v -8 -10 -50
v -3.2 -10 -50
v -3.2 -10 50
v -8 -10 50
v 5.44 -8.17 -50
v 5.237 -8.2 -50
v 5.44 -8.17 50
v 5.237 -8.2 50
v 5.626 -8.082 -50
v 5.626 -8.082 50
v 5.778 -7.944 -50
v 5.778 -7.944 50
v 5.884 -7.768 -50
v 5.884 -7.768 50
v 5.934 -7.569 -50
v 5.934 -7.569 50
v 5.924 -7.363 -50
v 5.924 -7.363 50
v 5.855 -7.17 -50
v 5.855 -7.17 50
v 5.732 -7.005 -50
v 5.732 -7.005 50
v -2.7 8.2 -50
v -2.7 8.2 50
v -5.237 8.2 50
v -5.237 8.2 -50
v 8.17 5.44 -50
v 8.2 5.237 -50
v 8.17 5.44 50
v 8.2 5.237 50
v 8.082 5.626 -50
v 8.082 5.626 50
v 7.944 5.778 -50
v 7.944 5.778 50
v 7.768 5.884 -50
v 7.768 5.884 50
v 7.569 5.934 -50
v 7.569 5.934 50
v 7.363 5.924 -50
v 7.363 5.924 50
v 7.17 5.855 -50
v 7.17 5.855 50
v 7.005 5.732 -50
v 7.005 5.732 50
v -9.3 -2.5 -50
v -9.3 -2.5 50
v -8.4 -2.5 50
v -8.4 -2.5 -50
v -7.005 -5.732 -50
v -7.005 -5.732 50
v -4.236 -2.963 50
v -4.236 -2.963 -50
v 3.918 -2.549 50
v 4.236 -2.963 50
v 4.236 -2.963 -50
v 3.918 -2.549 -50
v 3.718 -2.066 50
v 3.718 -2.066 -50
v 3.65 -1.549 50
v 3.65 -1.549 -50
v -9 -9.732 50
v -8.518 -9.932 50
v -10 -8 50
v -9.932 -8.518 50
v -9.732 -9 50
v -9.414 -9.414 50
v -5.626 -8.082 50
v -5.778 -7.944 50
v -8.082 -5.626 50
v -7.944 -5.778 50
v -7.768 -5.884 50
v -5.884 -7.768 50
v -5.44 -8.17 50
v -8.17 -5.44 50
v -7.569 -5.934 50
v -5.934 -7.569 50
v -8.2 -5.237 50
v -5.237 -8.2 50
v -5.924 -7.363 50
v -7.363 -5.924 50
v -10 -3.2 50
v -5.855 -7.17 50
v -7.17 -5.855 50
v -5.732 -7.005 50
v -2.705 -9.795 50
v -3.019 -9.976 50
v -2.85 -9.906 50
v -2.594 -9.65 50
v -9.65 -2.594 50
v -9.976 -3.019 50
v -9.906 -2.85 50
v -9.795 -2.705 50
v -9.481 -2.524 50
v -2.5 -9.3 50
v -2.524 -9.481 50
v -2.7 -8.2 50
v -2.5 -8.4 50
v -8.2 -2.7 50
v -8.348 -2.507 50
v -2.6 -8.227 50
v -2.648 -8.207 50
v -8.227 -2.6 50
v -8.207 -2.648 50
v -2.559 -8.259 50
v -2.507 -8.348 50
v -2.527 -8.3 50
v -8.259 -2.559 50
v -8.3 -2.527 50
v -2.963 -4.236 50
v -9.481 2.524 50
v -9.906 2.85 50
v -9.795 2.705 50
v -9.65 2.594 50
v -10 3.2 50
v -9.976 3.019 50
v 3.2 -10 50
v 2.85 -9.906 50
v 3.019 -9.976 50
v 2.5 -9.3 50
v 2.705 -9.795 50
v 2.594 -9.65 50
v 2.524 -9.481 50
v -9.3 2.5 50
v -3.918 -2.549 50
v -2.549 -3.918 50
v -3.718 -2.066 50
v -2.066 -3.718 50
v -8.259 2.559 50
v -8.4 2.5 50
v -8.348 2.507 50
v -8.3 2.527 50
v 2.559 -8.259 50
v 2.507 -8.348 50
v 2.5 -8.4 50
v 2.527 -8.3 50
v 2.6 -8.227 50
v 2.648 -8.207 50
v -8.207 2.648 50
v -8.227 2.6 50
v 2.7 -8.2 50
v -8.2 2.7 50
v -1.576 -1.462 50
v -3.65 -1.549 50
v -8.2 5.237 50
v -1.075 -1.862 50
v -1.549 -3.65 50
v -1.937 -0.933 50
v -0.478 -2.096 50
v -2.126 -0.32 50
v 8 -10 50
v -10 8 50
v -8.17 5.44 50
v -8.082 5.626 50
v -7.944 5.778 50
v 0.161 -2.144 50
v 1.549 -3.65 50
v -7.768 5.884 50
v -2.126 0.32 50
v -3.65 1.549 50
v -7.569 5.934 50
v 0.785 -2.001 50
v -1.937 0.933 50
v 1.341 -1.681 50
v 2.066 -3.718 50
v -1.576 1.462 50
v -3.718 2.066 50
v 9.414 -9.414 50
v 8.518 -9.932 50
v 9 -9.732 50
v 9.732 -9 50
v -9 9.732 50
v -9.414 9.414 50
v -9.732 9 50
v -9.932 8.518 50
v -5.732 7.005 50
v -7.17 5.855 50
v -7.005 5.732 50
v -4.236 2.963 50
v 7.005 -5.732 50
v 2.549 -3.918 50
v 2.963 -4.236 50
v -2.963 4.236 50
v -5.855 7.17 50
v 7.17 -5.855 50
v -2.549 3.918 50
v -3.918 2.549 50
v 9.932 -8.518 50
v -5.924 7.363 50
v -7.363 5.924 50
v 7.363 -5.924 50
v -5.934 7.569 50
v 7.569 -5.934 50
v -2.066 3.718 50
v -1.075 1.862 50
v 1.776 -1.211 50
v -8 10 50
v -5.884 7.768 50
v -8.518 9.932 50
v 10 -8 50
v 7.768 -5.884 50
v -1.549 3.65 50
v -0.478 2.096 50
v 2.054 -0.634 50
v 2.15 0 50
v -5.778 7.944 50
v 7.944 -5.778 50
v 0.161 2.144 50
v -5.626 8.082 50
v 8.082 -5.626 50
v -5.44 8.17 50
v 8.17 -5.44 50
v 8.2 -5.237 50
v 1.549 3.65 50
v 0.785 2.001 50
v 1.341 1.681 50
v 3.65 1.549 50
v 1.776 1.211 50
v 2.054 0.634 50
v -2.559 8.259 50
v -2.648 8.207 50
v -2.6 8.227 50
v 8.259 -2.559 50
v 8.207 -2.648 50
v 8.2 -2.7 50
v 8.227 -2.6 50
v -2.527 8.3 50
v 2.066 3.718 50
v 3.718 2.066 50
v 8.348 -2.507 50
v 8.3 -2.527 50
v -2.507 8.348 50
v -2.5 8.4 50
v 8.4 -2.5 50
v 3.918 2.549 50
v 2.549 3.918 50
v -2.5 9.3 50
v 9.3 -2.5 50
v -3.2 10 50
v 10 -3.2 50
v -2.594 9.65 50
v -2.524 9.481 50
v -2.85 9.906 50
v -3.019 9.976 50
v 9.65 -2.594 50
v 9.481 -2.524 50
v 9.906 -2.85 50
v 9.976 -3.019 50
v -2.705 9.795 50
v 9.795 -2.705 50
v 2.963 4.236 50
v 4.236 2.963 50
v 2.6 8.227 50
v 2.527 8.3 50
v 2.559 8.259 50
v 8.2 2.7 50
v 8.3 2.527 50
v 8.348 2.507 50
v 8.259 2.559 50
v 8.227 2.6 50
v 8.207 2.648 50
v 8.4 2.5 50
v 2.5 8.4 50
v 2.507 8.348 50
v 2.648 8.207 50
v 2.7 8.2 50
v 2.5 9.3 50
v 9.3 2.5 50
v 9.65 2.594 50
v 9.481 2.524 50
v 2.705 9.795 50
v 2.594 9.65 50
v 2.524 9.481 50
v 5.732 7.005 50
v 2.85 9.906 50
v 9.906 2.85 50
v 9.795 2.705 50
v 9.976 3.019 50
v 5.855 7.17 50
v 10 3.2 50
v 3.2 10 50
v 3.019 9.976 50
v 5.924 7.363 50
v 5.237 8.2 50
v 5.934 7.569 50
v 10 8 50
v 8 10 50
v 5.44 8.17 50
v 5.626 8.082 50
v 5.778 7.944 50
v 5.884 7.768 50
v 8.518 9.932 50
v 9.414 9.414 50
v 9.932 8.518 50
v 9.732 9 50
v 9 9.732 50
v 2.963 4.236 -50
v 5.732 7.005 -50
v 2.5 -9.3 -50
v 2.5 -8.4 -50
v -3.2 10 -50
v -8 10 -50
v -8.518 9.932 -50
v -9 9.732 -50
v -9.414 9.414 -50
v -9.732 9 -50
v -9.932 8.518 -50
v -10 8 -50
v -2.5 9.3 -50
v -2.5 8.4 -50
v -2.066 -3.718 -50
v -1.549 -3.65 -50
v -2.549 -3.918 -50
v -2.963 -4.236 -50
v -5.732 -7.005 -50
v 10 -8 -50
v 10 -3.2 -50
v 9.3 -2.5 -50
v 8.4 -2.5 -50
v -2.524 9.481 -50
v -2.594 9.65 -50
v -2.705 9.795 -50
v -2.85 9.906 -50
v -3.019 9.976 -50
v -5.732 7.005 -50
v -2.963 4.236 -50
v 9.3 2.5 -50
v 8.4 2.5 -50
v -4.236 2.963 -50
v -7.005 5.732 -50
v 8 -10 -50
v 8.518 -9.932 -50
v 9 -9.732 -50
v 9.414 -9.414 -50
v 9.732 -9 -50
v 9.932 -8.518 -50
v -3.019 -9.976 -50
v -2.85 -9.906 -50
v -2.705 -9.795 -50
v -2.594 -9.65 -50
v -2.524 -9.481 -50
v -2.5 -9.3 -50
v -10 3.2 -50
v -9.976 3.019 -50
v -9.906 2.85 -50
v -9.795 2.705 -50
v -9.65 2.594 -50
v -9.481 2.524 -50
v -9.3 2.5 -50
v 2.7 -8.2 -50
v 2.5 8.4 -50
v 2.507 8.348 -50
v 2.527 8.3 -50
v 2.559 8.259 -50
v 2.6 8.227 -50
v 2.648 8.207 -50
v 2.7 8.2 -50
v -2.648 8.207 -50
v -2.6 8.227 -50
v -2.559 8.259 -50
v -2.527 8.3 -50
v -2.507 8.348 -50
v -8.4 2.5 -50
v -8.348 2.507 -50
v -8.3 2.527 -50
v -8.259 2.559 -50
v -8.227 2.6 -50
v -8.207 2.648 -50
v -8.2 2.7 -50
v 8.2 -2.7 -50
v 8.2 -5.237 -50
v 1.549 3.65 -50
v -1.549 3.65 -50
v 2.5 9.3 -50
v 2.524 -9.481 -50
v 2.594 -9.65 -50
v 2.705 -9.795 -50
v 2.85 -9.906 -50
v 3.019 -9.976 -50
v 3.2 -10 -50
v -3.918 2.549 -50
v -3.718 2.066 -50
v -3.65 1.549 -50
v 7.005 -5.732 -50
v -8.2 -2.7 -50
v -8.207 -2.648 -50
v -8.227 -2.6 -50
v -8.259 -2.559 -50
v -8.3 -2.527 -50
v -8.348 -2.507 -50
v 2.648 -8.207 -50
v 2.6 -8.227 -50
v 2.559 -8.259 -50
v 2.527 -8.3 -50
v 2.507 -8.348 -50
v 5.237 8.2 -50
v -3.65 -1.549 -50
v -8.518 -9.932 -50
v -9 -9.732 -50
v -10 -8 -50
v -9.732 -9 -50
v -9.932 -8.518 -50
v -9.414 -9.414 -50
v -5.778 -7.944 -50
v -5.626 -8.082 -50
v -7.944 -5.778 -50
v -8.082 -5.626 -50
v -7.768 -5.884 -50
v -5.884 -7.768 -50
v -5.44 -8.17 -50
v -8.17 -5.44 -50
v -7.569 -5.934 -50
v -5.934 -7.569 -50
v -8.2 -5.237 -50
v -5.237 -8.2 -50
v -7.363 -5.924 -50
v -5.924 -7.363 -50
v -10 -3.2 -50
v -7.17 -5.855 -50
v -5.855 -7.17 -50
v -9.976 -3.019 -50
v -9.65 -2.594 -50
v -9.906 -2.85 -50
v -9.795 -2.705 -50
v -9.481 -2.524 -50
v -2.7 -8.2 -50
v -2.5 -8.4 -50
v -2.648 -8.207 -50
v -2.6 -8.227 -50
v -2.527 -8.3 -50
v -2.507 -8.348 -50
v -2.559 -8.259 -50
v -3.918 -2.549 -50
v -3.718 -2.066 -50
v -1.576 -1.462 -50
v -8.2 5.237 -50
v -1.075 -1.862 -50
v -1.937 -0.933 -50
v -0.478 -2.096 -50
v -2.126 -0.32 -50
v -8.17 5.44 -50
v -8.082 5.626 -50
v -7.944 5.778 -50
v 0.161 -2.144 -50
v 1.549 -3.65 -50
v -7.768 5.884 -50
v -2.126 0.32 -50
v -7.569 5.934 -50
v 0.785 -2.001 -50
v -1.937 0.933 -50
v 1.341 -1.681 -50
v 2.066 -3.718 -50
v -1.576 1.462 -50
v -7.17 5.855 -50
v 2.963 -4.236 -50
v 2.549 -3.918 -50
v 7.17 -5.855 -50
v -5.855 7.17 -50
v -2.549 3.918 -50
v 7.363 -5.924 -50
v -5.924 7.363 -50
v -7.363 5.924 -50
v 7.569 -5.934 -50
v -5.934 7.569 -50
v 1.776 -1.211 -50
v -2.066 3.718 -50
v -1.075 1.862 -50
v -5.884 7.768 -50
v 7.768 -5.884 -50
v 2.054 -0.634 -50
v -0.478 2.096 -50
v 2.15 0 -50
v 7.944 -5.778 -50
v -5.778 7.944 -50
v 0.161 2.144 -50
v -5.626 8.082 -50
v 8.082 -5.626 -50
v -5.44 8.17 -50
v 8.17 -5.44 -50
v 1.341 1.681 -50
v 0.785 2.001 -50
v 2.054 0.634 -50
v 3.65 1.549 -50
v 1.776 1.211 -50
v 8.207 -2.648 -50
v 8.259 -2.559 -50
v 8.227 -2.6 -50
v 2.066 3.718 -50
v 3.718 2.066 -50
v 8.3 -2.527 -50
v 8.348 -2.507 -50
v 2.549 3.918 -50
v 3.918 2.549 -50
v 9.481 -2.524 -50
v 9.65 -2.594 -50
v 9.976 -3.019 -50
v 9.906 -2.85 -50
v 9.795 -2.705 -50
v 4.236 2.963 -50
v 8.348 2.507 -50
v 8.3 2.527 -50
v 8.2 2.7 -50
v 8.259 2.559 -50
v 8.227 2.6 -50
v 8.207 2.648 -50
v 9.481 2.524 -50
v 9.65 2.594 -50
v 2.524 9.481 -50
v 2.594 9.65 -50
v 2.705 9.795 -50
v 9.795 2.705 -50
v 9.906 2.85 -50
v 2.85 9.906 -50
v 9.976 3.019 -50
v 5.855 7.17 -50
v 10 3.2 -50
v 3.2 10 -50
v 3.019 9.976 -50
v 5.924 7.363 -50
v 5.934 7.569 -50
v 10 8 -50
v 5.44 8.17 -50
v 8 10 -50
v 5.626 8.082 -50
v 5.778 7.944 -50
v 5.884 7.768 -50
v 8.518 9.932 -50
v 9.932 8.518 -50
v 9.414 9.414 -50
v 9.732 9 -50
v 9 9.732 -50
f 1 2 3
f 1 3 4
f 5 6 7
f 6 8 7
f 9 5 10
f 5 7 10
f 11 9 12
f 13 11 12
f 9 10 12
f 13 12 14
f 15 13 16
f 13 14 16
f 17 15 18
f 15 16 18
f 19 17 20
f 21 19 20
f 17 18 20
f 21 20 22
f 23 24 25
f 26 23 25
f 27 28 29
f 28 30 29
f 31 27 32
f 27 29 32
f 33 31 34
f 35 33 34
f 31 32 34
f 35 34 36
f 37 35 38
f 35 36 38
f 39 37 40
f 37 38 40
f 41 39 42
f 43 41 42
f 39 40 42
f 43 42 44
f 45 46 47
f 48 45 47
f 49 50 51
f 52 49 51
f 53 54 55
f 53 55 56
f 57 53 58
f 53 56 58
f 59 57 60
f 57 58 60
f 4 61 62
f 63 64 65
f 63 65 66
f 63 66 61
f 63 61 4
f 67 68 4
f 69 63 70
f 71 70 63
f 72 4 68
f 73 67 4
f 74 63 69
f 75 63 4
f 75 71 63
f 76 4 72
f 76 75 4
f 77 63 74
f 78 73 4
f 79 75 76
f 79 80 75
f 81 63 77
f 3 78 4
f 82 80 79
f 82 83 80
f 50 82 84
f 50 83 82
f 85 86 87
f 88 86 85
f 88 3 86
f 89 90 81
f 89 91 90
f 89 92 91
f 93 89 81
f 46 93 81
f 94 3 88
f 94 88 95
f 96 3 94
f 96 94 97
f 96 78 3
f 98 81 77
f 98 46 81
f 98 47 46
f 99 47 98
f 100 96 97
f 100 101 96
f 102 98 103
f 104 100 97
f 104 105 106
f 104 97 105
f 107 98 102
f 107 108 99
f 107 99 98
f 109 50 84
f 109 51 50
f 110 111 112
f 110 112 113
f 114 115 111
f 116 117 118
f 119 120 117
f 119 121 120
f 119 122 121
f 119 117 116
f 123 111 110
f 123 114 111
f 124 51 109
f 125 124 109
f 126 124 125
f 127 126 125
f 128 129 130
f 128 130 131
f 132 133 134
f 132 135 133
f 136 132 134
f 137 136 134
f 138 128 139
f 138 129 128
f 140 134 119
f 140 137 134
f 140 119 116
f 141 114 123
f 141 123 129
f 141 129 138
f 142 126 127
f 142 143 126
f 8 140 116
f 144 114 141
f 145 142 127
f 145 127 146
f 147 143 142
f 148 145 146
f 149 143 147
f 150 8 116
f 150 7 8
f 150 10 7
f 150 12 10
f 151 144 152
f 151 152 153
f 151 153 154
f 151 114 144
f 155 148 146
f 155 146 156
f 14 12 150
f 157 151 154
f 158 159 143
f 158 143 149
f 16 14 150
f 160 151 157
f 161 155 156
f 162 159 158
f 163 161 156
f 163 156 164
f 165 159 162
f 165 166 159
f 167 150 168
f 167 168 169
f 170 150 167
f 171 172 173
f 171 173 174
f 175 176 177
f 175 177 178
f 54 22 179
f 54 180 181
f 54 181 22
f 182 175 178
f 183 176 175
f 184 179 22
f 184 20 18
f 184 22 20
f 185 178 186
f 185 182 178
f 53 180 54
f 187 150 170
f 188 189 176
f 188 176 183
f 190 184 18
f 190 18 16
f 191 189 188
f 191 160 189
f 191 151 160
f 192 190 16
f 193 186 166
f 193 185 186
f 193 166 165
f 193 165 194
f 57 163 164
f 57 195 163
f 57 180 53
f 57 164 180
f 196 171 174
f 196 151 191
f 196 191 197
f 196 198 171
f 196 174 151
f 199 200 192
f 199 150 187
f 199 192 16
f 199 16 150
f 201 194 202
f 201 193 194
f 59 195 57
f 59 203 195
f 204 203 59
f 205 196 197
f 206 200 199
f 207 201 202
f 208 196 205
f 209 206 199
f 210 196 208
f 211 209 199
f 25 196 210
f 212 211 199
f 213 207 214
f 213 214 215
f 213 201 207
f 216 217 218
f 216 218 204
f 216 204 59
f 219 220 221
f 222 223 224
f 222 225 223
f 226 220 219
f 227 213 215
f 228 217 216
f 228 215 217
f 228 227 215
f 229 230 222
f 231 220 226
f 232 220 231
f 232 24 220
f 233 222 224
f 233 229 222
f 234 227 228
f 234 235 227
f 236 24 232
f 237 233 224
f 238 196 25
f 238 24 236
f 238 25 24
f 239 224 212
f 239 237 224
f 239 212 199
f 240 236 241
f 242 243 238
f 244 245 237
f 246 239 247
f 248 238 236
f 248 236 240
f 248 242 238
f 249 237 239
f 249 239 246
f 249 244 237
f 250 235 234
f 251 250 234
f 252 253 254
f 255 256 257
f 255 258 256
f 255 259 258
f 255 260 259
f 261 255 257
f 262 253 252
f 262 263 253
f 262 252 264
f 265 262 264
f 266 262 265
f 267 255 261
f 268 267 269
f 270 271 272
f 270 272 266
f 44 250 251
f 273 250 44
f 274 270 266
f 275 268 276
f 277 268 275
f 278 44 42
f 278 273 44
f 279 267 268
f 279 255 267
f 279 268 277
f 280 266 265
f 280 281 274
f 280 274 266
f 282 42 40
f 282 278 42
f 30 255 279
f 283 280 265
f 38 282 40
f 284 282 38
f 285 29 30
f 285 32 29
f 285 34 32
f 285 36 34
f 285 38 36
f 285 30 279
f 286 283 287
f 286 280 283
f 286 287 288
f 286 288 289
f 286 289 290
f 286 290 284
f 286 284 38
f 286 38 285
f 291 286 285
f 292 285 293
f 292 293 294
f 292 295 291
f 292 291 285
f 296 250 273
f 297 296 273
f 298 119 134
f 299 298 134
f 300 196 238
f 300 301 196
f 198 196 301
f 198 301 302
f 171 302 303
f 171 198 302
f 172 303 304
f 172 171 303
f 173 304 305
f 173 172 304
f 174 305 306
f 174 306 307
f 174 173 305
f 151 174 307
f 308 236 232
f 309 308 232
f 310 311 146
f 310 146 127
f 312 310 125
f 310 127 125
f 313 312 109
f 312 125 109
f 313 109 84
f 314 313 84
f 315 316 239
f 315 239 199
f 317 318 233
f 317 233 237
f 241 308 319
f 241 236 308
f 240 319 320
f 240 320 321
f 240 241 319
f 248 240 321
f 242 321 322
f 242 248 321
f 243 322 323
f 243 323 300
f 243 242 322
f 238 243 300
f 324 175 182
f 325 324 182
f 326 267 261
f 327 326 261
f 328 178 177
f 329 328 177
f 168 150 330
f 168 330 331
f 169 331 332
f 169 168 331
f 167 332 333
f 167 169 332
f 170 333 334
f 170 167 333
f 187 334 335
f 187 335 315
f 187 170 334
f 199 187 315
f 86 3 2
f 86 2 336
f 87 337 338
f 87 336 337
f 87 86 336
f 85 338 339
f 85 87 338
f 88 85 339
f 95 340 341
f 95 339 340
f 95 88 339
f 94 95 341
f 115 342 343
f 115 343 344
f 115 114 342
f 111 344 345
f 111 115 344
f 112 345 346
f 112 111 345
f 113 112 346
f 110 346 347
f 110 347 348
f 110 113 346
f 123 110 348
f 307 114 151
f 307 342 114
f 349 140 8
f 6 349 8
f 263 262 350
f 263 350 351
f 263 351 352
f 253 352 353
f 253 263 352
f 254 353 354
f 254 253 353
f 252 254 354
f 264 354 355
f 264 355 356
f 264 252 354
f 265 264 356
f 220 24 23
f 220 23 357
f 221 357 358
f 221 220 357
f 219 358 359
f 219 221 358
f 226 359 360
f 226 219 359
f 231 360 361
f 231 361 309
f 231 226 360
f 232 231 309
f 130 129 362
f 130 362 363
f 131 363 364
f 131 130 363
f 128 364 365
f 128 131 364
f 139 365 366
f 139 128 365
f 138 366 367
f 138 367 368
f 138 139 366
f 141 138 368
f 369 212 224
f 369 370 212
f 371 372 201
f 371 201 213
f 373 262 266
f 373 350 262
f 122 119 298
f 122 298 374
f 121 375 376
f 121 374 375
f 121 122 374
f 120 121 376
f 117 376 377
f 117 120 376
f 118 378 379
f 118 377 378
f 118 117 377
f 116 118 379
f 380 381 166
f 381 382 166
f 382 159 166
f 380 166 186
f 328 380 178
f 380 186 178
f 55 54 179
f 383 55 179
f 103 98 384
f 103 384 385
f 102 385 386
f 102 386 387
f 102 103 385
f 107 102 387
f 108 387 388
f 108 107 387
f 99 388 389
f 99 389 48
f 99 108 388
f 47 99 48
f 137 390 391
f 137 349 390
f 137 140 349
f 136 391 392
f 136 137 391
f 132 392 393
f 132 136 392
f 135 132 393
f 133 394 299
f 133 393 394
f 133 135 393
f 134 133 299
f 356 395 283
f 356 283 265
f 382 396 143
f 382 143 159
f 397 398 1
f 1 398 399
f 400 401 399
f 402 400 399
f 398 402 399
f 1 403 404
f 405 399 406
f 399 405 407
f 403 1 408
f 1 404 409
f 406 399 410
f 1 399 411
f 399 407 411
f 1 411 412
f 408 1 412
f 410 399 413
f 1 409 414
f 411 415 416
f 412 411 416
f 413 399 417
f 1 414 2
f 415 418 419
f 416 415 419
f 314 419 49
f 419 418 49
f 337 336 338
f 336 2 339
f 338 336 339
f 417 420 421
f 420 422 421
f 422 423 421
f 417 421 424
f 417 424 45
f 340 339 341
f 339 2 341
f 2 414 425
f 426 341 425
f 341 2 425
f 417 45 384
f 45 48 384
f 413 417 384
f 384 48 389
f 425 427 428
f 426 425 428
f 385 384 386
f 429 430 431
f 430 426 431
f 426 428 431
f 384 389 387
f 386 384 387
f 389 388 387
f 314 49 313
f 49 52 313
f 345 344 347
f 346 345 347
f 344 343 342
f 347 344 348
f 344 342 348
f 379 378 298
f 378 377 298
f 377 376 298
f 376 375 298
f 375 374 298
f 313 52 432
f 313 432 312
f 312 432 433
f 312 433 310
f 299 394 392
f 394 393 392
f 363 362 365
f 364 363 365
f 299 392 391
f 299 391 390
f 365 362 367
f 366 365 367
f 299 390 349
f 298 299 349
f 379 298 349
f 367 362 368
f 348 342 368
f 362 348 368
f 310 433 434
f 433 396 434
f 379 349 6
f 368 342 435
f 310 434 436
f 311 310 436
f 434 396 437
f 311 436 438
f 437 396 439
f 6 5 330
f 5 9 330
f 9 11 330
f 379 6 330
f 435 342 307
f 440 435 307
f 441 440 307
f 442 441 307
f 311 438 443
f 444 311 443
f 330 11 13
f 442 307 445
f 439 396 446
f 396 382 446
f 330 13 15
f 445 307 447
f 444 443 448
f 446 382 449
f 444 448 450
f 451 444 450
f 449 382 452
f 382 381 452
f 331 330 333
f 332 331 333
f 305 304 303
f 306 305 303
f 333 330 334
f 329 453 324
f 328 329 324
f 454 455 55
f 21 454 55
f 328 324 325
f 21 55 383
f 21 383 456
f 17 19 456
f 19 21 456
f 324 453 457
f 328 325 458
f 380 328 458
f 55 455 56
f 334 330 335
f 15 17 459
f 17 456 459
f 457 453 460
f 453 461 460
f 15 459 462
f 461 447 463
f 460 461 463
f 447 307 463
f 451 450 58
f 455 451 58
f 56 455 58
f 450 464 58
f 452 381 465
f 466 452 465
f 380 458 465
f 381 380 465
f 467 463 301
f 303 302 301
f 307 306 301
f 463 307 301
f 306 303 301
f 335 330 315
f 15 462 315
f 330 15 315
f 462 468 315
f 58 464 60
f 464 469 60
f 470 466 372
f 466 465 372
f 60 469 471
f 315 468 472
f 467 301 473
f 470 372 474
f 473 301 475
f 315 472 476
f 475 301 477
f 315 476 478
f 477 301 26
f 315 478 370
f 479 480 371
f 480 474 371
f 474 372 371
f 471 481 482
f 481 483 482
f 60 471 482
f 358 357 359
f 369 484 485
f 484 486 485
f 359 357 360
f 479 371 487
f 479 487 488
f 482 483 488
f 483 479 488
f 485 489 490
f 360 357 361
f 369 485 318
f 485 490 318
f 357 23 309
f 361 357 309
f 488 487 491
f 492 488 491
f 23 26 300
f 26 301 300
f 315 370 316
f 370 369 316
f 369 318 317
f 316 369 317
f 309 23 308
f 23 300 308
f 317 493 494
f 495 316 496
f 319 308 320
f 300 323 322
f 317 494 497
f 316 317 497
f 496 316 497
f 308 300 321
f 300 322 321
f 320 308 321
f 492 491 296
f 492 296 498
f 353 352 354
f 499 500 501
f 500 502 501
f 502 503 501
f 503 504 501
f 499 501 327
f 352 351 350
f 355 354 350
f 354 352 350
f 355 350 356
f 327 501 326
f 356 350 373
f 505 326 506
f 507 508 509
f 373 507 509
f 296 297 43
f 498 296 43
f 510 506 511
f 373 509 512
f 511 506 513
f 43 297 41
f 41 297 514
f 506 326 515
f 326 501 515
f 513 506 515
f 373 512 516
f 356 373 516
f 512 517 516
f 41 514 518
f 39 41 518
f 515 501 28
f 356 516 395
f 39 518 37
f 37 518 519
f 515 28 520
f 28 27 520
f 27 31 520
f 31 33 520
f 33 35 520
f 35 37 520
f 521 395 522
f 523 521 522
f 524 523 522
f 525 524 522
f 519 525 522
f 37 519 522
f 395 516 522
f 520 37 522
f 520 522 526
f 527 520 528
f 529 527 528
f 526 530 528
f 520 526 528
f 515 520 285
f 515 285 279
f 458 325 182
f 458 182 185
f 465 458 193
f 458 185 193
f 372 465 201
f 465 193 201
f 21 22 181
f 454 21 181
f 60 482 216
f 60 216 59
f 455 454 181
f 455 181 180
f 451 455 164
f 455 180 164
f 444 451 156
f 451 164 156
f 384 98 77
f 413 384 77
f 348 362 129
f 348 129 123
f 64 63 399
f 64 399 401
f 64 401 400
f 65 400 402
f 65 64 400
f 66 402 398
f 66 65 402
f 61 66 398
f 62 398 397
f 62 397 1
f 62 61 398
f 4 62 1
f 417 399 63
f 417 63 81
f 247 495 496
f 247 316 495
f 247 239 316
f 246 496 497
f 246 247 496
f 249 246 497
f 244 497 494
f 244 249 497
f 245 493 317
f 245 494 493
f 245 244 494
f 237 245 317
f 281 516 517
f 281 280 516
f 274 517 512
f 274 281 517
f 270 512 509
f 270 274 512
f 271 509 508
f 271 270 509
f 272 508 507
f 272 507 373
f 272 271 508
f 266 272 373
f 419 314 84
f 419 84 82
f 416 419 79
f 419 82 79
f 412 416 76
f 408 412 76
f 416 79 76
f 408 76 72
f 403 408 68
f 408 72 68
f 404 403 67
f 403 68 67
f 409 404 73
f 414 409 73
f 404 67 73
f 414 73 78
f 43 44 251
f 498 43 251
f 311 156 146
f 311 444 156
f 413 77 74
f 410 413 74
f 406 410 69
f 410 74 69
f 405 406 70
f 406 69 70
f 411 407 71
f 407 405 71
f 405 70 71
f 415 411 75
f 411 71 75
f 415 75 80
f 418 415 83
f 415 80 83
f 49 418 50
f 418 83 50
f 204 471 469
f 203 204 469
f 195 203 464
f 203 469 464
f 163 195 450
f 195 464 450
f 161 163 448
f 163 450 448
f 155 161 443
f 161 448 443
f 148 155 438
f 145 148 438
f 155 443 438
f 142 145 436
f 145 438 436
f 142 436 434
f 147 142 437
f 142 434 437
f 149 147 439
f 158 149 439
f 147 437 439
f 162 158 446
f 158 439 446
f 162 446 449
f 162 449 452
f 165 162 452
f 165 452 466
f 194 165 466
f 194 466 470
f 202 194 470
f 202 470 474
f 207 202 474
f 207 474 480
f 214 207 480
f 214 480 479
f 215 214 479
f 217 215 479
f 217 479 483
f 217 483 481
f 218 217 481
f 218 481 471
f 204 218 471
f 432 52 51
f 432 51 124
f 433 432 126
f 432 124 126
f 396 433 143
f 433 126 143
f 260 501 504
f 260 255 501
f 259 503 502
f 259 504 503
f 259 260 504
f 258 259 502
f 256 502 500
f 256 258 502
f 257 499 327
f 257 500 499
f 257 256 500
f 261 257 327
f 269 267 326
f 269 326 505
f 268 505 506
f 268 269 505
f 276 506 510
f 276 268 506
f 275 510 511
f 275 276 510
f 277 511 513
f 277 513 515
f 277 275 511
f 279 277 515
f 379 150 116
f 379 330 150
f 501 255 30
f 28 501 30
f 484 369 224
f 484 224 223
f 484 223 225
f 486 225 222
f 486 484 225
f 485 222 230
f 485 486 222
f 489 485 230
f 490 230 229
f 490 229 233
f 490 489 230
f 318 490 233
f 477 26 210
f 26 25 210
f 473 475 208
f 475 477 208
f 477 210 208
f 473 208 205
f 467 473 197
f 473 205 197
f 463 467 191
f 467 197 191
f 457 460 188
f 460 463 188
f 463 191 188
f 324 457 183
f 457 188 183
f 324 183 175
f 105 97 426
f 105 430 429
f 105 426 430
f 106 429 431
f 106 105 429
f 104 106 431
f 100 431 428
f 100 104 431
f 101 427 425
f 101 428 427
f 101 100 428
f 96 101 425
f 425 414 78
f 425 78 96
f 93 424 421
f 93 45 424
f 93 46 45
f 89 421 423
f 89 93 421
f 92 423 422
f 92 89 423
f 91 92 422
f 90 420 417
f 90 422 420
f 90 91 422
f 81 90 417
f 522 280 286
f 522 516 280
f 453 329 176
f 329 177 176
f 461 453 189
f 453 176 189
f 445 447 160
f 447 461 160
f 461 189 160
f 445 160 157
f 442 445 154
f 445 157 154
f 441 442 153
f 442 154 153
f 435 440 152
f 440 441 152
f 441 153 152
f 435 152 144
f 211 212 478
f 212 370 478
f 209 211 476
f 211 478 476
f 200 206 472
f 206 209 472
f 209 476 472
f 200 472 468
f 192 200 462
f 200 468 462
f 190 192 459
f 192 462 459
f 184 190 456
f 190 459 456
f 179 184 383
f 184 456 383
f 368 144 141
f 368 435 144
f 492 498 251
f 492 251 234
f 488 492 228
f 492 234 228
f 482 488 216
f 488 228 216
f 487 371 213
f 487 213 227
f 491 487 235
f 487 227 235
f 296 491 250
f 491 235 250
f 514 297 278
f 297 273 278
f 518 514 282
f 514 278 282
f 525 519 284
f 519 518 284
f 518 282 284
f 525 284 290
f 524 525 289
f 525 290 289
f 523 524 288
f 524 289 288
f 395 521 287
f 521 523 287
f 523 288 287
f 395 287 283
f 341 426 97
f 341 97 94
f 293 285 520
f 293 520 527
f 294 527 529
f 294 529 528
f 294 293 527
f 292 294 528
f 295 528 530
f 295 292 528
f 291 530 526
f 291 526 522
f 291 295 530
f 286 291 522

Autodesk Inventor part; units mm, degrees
ref_plane "YZ Plane" through (0, 0, 0) normal (1, 0, 0) x (0, 1, 0)
ref_plane "XZ Plane" through (0, 0, 0) normal (0, 1, 0) x (-1, 0, 0)
ref_plane "XY Plane" through (0, 0, 0) normal (0, 0, 1) x (1, 0, 0)
sketch "Sketch1" plane through (0, 0, 0) normal (0, 0, 1) x (1, 0, 0)
  circle A0 centre (0, 0) radius 2.15
  line L0 (-10, 10) -> (-2.5, 10)
  line L1 (-2.5, 10) -> (-2.5, 8.2)
  line L2 (-2.5, 8.2) -> (-6.9272, 8.2)
  line L3 (-6.9272, 8.2) -> (-2.3772, 3.65)
  line L4 (-2.3772, 3.65) -> (2.3772, 3.65)
  line L5 (2.3772, 3.65) -> (6.9272, 8.2)
  line L6 (6.9272, 8.2) -> (2.5, 8.2)
  line L7 (2.5, 8.2) -> (2.5, 10)
  line L8 (2.5, 10) -> (10, 10)
  line L9 (10, 10) -> (10, 2.5)
  line L10 (10, 2.5) -> (8.2, 2.5)
  line L11 (8.2, 2.5) -> (8.2, 6.9272)
  line L12 (8.2, 6.9272) -> (3.65, 2.3772)
  line L13 (3.65, 2.3772) -> (3.65, -2.3772)
  line L14 (3.65, -2.3772) -> (8.2, -6.9272)
  line L15 (8.2, -6.9272) -> (8.2, -2.5)
  line L16 (8.2, -2.5) -> (10, -2.5)
  line L17 (10, -2.5) -> (10, -10)
  line L18 (10, -10) -> (2.5, -10)
  line L19 (2.5, -10) -> (2.5, -8.2)
  line L20 (2.5, -8.2) -> (6.9272, -8.2)
  line L21 (6.9272, -8.2) -> (2.3772, -3.65)
  line L22 (2.3772, -3.65) -> (-2.3772, -3.65)
  line L23 (-2.3772, -3.65) -> (-6.9272, -8.2)
  line L24 (-6.9272, -8.2) -> (-2.5, -8.2)
  line L25 (-2.5, -8.2) -> (-2.5, -10)
  line L26 (-2.5, -10) -> (-10, -10)
  line L27 (-10, -10) -> (-10, -2.5)
  line L28 (-10, -2.5) -> (-8.2, -2.5)
  line L29 (-8.2, -2.5) -> (-8.2, -6.9272)
  line L30 (-8.2, -6.9272) -> (-3.65, -2.3772)
  line L31 (-3.65, -2.3772) -> (-3.65, 2.3772)
  line L32 (-3.65, 2.3772) -> (-8.2, 6.9272)
  line L33 (-8.2, 6.9272) -> (-8.2, 2.5)
  line L34 (-8.2, 2.5) -> (-10, 2.5)
  line L35 (-10, 2.5) -> (-10, 10)
  line L36 (0, 0) -> (-30.8654, 30.8654)
  line L37 (0, 0) -> (30.8654, 30.8654)
  line L38 (0, 0) -> (42.5392, 0)
  line L39 (0, 0) -> (0, 44.3419)
  dimension "d0" = 45
  dimension "d1" = 90
  dimension "Breite" = 20
  dimension "Tiefe_Schiene" = 6.35
  dimension "d2" = 1.8
  dimension "Durchmesser_Loch" = 4.3
  dimension "Wandstaerke" = 1.8
  dimension "d3" = 1.8
  dimension "Breite_Schiene" = 5
  dimension "d4" = 5
extrude "Extrusion1" add sketch "Sketch1" along normal mid plane 100 contours L38 L13 L14 L15 L16 L17 L18 L19 L20 L21 L22 L23 L24 L25 L26 L27 L28 L29 L30 L31 L32 L33 L34 L35 L36 A0 | A0 L37 L9 L10 L11 L12 L13 L38 | A0 L39 L4 L5 L6 L7 L8 L37 | L36 L0 L1 L2 L3 L4 L39 A0
fillet "Fillet1" radius 2 4 edges at (10, 10, 0) (-10, 10, 0) (10, -10, 0) (-10, -10, 0)
fillet "Fillet2" radius 0.2 8 edges at (-2.5, 8.2, 0) (2.5, 8.2, 0) (8.2, 2.5, 0) (8.2, -2.5, 0) (-2.5, -8.2, 0) (-8.2, -2.5, 0) (-8.2, 2.5, 0) (2.5, -8.2, 0)
fillet "Fillet3" radius 0.7 16 edges at (-2.5, 10, 0) (2.5, 10, 0) (10, 2.5, 0) (10, -2.5, 0) (2.5, -10, 0) (-2.5, -10, 0) (-10, -2.5, 0) (-10, 2.5, 0) (-6.9272, -8.2, 0) (-8.2, -6.9272, 0) (6.9272, -8.2, 0) (8.2, -6.9272, 0) (8.2, 6.9272, 0) (6.9272, 8.2, 0) (-6.9272, 8.2, 0) (-8.2, 6.9272, 0)
fillet "Fillet4" radius 2 8 edges at (-3.65, 2.3772, 0) (-2.3772, 3.65, 0) (2.3772, 3.65, 0) (3.65, 2.3772, 0) (3.65, -2.3772, 0) (2.3772, -3.65, 0) (-2.3772, -3.65, 0) (-3.65, -2.3772, 0)
equation "\"d2\" = Wandstaerke"
equation "\"d3\" = Wandstaerke"
equation "\"d4\" = Breite_Schiene"
properties part number "503.015.01_ITEM_20x20_100mm"
